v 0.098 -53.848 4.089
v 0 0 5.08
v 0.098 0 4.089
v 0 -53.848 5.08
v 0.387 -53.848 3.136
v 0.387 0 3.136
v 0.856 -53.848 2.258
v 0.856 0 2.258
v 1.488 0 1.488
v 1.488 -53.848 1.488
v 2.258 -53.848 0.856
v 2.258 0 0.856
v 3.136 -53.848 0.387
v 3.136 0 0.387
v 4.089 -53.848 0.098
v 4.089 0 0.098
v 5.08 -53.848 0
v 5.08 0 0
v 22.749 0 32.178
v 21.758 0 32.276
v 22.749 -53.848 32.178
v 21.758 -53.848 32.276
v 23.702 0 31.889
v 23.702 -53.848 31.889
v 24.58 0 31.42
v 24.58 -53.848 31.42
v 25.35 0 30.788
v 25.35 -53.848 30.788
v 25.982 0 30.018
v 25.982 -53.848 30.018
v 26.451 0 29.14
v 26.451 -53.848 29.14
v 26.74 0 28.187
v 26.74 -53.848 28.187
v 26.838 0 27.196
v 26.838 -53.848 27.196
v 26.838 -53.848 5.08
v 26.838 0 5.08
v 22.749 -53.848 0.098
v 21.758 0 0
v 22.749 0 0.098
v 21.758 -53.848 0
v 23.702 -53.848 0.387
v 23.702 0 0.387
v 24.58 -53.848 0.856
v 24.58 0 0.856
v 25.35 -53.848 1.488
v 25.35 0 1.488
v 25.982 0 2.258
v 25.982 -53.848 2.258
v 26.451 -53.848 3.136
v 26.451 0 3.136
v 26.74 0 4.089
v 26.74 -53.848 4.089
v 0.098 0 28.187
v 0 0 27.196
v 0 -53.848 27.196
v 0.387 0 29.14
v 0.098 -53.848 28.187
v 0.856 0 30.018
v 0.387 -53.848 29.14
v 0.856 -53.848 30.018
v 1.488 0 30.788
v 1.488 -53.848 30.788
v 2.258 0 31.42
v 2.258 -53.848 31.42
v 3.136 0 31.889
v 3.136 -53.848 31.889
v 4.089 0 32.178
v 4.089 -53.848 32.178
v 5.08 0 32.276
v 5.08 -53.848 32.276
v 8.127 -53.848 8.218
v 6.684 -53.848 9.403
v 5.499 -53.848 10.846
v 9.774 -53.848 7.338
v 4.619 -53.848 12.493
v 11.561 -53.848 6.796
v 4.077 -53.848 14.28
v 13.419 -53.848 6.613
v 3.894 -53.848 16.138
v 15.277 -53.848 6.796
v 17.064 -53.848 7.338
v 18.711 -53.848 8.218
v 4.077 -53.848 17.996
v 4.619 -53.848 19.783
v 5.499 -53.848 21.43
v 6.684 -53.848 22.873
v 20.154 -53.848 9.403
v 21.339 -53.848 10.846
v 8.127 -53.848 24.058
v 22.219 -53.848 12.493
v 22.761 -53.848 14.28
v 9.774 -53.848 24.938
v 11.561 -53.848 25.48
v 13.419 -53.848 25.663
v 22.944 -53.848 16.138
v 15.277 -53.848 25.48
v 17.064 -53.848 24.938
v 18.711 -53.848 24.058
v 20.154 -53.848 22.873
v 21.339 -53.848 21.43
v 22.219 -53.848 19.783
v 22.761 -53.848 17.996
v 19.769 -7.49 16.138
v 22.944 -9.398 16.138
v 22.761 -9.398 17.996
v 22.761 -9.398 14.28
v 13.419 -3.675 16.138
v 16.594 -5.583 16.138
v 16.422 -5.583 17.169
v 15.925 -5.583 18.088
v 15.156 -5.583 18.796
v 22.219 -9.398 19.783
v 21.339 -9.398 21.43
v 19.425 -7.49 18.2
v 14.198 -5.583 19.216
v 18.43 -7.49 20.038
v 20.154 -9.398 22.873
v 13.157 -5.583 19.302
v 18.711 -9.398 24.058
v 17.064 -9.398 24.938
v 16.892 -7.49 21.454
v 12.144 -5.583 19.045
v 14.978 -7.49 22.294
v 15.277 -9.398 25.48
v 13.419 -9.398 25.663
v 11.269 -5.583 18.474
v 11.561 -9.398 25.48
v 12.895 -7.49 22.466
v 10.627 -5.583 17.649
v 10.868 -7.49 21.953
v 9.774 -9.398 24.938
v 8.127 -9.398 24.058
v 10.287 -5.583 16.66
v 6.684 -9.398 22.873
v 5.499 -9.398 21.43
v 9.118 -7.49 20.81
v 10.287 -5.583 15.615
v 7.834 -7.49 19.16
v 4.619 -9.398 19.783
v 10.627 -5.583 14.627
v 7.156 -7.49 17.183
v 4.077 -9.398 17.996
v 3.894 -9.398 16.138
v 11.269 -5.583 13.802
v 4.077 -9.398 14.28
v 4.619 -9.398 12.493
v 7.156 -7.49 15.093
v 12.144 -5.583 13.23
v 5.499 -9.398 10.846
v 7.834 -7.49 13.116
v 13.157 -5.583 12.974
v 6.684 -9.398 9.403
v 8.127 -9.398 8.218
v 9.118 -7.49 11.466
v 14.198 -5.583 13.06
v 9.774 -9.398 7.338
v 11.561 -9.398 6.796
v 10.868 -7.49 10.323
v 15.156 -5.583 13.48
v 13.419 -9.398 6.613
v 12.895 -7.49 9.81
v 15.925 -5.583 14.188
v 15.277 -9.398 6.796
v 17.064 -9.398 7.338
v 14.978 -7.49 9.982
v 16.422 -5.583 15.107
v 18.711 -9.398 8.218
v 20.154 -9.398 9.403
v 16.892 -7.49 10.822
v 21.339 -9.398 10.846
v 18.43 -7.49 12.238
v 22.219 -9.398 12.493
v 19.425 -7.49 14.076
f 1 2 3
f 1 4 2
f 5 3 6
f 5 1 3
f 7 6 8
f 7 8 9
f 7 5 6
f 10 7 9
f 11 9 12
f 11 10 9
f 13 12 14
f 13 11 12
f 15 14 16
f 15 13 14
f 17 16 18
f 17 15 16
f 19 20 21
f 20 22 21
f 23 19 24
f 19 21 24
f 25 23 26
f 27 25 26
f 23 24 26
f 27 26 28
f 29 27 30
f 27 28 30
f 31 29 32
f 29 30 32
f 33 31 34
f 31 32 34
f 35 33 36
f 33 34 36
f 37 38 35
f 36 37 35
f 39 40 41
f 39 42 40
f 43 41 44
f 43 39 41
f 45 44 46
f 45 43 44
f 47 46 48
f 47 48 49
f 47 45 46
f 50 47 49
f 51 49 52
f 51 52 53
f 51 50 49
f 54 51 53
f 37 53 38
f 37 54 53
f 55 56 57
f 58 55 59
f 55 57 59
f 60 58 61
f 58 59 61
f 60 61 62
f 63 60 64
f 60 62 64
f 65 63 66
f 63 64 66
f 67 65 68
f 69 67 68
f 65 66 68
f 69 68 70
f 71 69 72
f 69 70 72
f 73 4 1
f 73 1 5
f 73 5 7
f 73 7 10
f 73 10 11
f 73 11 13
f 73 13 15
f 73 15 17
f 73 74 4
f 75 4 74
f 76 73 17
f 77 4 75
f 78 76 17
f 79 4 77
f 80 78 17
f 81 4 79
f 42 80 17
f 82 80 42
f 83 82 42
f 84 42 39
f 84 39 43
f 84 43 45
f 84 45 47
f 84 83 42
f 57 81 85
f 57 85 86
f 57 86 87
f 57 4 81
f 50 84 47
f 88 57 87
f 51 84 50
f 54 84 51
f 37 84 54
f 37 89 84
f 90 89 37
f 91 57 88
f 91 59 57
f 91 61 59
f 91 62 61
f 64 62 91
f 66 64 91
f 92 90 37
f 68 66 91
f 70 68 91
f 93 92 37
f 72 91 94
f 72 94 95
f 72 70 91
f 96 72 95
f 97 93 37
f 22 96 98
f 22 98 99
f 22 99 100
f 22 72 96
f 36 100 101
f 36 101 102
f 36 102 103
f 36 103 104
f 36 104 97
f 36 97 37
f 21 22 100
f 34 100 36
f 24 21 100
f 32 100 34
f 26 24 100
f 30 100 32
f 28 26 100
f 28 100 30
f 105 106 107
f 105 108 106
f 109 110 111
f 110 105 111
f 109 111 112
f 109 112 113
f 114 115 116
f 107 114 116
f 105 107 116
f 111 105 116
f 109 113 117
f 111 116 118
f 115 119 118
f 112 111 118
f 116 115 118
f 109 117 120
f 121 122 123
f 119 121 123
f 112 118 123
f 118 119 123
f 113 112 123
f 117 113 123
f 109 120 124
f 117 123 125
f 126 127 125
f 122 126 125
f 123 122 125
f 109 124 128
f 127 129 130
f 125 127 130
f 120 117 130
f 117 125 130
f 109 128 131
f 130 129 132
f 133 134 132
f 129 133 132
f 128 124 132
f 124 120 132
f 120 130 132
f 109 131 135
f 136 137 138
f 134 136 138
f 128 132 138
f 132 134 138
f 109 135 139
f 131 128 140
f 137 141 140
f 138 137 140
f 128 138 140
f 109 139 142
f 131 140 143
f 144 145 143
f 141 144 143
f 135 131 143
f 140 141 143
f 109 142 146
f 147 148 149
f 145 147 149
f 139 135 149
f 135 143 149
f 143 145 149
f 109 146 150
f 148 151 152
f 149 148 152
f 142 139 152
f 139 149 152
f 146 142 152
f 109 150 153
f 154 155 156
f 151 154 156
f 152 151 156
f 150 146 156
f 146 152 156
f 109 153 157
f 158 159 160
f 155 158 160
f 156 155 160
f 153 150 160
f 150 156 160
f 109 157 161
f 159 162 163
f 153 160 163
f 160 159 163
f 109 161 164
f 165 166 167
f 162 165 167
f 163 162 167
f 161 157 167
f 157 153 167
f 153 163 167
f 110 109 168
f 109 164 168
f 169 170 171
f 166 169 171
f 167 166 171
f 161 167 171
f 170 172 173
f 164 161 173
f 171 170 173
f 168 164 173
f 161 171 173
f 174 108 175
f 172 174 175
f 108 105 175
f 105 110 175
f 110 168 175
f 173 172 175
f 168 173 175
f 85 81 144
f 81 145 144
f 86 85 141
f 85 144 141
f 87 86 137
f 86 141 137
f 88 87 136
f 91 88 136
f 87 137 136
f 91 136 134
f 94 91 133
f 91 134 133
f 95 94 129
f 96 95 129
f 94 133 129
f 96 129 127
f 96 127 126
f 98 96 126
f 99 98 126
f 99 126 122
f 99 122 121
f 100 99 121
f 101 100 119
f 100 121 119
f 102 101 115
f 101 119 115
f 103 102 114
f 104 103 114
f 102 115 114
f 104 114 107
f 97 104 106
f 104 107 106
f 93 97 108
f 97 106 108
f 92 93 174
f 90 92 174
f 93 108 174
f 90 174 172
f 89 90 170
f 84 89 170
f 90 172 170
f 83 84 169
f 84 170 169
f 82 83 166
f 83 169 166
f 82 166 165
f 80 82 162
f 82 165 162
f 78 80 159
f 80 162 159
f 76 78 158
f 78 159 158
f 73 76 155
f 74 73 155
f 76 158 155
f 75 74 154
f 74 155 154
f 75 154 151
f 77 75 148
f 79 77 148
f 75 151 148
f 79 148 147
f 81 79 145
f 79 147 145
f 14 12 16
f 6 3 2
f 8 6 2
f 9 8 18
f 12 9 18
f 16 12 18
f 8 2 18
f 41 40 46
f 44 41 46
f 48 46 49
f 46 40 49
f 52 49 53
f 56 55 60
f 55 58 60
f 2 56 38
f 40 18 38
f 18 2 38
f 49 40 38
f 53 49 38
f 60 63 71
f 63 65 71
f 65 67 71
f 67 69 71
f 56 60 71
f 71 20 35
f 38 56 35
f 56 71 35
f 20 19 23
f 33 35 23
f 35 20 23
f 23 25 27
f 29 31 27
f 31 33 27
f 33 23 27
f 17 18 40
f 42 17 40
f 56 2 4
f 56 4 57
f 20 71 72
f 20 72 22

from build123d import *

# Parameters (mm, degrees)
F0_W     = 26.8379747868
F0_H     = 32.2756916285
F1_DEPTH = 53.848
F2_R     = 10.4478277996
F3_DEPTH = 43.688
F7_D     = 19.05
F7_DEPTH = 44.45
F7_TIP   = 5.7231973962
F8_R     = 5.08


# Not quite as in the source:
# - the program builds the solid bodies; features that only make, move or delete a surface that nothing else refers to are left out


with BuildPart() as f1:
    # F0 (on Front) → F1 (new body)
    with BuildSketch(Plane.XZ):
        with Locations((13.4189873934, 16.1378458142)):
            Rectangle(F0_W, F0_H)
    extrude(amount=F1_DEPTH)

    # F2 (on face) → F3 (join)
    with BuildSketch(Plane.XZ.offset(53.848)):
        with Locations((11.908470653, 14.5087121055)):
            Circle(F2_R)
    extrude(amount=-F3_DEPTH)

    # F7
    with Locations(Plane.XZ.offset(53.848)):
        with Locations((13.4189873934, 16.1378458142)):
            Hole(F7_D / 2, depth=F7_DEPTH)
            with Locations((0, 0, -(F7_DEPTH + F7_TIP / 2))):  # 118° drill point
                Cone(0, F7_D / 2, F7_TIP, mode=Mode.SUBTRACT)

    # F8
    f8_edges = [f1.edges().sort_by_distance(p)[0] for p in [
        (0, -26.924, 32.275692),
        (26.837975, -26.924, 32.275692),
        (26.837975, -26.924, 0),
        (0, -26.924, 0),
    ]]
    fillet(f8_edges, radius=F8_R)


solid = f1.part
